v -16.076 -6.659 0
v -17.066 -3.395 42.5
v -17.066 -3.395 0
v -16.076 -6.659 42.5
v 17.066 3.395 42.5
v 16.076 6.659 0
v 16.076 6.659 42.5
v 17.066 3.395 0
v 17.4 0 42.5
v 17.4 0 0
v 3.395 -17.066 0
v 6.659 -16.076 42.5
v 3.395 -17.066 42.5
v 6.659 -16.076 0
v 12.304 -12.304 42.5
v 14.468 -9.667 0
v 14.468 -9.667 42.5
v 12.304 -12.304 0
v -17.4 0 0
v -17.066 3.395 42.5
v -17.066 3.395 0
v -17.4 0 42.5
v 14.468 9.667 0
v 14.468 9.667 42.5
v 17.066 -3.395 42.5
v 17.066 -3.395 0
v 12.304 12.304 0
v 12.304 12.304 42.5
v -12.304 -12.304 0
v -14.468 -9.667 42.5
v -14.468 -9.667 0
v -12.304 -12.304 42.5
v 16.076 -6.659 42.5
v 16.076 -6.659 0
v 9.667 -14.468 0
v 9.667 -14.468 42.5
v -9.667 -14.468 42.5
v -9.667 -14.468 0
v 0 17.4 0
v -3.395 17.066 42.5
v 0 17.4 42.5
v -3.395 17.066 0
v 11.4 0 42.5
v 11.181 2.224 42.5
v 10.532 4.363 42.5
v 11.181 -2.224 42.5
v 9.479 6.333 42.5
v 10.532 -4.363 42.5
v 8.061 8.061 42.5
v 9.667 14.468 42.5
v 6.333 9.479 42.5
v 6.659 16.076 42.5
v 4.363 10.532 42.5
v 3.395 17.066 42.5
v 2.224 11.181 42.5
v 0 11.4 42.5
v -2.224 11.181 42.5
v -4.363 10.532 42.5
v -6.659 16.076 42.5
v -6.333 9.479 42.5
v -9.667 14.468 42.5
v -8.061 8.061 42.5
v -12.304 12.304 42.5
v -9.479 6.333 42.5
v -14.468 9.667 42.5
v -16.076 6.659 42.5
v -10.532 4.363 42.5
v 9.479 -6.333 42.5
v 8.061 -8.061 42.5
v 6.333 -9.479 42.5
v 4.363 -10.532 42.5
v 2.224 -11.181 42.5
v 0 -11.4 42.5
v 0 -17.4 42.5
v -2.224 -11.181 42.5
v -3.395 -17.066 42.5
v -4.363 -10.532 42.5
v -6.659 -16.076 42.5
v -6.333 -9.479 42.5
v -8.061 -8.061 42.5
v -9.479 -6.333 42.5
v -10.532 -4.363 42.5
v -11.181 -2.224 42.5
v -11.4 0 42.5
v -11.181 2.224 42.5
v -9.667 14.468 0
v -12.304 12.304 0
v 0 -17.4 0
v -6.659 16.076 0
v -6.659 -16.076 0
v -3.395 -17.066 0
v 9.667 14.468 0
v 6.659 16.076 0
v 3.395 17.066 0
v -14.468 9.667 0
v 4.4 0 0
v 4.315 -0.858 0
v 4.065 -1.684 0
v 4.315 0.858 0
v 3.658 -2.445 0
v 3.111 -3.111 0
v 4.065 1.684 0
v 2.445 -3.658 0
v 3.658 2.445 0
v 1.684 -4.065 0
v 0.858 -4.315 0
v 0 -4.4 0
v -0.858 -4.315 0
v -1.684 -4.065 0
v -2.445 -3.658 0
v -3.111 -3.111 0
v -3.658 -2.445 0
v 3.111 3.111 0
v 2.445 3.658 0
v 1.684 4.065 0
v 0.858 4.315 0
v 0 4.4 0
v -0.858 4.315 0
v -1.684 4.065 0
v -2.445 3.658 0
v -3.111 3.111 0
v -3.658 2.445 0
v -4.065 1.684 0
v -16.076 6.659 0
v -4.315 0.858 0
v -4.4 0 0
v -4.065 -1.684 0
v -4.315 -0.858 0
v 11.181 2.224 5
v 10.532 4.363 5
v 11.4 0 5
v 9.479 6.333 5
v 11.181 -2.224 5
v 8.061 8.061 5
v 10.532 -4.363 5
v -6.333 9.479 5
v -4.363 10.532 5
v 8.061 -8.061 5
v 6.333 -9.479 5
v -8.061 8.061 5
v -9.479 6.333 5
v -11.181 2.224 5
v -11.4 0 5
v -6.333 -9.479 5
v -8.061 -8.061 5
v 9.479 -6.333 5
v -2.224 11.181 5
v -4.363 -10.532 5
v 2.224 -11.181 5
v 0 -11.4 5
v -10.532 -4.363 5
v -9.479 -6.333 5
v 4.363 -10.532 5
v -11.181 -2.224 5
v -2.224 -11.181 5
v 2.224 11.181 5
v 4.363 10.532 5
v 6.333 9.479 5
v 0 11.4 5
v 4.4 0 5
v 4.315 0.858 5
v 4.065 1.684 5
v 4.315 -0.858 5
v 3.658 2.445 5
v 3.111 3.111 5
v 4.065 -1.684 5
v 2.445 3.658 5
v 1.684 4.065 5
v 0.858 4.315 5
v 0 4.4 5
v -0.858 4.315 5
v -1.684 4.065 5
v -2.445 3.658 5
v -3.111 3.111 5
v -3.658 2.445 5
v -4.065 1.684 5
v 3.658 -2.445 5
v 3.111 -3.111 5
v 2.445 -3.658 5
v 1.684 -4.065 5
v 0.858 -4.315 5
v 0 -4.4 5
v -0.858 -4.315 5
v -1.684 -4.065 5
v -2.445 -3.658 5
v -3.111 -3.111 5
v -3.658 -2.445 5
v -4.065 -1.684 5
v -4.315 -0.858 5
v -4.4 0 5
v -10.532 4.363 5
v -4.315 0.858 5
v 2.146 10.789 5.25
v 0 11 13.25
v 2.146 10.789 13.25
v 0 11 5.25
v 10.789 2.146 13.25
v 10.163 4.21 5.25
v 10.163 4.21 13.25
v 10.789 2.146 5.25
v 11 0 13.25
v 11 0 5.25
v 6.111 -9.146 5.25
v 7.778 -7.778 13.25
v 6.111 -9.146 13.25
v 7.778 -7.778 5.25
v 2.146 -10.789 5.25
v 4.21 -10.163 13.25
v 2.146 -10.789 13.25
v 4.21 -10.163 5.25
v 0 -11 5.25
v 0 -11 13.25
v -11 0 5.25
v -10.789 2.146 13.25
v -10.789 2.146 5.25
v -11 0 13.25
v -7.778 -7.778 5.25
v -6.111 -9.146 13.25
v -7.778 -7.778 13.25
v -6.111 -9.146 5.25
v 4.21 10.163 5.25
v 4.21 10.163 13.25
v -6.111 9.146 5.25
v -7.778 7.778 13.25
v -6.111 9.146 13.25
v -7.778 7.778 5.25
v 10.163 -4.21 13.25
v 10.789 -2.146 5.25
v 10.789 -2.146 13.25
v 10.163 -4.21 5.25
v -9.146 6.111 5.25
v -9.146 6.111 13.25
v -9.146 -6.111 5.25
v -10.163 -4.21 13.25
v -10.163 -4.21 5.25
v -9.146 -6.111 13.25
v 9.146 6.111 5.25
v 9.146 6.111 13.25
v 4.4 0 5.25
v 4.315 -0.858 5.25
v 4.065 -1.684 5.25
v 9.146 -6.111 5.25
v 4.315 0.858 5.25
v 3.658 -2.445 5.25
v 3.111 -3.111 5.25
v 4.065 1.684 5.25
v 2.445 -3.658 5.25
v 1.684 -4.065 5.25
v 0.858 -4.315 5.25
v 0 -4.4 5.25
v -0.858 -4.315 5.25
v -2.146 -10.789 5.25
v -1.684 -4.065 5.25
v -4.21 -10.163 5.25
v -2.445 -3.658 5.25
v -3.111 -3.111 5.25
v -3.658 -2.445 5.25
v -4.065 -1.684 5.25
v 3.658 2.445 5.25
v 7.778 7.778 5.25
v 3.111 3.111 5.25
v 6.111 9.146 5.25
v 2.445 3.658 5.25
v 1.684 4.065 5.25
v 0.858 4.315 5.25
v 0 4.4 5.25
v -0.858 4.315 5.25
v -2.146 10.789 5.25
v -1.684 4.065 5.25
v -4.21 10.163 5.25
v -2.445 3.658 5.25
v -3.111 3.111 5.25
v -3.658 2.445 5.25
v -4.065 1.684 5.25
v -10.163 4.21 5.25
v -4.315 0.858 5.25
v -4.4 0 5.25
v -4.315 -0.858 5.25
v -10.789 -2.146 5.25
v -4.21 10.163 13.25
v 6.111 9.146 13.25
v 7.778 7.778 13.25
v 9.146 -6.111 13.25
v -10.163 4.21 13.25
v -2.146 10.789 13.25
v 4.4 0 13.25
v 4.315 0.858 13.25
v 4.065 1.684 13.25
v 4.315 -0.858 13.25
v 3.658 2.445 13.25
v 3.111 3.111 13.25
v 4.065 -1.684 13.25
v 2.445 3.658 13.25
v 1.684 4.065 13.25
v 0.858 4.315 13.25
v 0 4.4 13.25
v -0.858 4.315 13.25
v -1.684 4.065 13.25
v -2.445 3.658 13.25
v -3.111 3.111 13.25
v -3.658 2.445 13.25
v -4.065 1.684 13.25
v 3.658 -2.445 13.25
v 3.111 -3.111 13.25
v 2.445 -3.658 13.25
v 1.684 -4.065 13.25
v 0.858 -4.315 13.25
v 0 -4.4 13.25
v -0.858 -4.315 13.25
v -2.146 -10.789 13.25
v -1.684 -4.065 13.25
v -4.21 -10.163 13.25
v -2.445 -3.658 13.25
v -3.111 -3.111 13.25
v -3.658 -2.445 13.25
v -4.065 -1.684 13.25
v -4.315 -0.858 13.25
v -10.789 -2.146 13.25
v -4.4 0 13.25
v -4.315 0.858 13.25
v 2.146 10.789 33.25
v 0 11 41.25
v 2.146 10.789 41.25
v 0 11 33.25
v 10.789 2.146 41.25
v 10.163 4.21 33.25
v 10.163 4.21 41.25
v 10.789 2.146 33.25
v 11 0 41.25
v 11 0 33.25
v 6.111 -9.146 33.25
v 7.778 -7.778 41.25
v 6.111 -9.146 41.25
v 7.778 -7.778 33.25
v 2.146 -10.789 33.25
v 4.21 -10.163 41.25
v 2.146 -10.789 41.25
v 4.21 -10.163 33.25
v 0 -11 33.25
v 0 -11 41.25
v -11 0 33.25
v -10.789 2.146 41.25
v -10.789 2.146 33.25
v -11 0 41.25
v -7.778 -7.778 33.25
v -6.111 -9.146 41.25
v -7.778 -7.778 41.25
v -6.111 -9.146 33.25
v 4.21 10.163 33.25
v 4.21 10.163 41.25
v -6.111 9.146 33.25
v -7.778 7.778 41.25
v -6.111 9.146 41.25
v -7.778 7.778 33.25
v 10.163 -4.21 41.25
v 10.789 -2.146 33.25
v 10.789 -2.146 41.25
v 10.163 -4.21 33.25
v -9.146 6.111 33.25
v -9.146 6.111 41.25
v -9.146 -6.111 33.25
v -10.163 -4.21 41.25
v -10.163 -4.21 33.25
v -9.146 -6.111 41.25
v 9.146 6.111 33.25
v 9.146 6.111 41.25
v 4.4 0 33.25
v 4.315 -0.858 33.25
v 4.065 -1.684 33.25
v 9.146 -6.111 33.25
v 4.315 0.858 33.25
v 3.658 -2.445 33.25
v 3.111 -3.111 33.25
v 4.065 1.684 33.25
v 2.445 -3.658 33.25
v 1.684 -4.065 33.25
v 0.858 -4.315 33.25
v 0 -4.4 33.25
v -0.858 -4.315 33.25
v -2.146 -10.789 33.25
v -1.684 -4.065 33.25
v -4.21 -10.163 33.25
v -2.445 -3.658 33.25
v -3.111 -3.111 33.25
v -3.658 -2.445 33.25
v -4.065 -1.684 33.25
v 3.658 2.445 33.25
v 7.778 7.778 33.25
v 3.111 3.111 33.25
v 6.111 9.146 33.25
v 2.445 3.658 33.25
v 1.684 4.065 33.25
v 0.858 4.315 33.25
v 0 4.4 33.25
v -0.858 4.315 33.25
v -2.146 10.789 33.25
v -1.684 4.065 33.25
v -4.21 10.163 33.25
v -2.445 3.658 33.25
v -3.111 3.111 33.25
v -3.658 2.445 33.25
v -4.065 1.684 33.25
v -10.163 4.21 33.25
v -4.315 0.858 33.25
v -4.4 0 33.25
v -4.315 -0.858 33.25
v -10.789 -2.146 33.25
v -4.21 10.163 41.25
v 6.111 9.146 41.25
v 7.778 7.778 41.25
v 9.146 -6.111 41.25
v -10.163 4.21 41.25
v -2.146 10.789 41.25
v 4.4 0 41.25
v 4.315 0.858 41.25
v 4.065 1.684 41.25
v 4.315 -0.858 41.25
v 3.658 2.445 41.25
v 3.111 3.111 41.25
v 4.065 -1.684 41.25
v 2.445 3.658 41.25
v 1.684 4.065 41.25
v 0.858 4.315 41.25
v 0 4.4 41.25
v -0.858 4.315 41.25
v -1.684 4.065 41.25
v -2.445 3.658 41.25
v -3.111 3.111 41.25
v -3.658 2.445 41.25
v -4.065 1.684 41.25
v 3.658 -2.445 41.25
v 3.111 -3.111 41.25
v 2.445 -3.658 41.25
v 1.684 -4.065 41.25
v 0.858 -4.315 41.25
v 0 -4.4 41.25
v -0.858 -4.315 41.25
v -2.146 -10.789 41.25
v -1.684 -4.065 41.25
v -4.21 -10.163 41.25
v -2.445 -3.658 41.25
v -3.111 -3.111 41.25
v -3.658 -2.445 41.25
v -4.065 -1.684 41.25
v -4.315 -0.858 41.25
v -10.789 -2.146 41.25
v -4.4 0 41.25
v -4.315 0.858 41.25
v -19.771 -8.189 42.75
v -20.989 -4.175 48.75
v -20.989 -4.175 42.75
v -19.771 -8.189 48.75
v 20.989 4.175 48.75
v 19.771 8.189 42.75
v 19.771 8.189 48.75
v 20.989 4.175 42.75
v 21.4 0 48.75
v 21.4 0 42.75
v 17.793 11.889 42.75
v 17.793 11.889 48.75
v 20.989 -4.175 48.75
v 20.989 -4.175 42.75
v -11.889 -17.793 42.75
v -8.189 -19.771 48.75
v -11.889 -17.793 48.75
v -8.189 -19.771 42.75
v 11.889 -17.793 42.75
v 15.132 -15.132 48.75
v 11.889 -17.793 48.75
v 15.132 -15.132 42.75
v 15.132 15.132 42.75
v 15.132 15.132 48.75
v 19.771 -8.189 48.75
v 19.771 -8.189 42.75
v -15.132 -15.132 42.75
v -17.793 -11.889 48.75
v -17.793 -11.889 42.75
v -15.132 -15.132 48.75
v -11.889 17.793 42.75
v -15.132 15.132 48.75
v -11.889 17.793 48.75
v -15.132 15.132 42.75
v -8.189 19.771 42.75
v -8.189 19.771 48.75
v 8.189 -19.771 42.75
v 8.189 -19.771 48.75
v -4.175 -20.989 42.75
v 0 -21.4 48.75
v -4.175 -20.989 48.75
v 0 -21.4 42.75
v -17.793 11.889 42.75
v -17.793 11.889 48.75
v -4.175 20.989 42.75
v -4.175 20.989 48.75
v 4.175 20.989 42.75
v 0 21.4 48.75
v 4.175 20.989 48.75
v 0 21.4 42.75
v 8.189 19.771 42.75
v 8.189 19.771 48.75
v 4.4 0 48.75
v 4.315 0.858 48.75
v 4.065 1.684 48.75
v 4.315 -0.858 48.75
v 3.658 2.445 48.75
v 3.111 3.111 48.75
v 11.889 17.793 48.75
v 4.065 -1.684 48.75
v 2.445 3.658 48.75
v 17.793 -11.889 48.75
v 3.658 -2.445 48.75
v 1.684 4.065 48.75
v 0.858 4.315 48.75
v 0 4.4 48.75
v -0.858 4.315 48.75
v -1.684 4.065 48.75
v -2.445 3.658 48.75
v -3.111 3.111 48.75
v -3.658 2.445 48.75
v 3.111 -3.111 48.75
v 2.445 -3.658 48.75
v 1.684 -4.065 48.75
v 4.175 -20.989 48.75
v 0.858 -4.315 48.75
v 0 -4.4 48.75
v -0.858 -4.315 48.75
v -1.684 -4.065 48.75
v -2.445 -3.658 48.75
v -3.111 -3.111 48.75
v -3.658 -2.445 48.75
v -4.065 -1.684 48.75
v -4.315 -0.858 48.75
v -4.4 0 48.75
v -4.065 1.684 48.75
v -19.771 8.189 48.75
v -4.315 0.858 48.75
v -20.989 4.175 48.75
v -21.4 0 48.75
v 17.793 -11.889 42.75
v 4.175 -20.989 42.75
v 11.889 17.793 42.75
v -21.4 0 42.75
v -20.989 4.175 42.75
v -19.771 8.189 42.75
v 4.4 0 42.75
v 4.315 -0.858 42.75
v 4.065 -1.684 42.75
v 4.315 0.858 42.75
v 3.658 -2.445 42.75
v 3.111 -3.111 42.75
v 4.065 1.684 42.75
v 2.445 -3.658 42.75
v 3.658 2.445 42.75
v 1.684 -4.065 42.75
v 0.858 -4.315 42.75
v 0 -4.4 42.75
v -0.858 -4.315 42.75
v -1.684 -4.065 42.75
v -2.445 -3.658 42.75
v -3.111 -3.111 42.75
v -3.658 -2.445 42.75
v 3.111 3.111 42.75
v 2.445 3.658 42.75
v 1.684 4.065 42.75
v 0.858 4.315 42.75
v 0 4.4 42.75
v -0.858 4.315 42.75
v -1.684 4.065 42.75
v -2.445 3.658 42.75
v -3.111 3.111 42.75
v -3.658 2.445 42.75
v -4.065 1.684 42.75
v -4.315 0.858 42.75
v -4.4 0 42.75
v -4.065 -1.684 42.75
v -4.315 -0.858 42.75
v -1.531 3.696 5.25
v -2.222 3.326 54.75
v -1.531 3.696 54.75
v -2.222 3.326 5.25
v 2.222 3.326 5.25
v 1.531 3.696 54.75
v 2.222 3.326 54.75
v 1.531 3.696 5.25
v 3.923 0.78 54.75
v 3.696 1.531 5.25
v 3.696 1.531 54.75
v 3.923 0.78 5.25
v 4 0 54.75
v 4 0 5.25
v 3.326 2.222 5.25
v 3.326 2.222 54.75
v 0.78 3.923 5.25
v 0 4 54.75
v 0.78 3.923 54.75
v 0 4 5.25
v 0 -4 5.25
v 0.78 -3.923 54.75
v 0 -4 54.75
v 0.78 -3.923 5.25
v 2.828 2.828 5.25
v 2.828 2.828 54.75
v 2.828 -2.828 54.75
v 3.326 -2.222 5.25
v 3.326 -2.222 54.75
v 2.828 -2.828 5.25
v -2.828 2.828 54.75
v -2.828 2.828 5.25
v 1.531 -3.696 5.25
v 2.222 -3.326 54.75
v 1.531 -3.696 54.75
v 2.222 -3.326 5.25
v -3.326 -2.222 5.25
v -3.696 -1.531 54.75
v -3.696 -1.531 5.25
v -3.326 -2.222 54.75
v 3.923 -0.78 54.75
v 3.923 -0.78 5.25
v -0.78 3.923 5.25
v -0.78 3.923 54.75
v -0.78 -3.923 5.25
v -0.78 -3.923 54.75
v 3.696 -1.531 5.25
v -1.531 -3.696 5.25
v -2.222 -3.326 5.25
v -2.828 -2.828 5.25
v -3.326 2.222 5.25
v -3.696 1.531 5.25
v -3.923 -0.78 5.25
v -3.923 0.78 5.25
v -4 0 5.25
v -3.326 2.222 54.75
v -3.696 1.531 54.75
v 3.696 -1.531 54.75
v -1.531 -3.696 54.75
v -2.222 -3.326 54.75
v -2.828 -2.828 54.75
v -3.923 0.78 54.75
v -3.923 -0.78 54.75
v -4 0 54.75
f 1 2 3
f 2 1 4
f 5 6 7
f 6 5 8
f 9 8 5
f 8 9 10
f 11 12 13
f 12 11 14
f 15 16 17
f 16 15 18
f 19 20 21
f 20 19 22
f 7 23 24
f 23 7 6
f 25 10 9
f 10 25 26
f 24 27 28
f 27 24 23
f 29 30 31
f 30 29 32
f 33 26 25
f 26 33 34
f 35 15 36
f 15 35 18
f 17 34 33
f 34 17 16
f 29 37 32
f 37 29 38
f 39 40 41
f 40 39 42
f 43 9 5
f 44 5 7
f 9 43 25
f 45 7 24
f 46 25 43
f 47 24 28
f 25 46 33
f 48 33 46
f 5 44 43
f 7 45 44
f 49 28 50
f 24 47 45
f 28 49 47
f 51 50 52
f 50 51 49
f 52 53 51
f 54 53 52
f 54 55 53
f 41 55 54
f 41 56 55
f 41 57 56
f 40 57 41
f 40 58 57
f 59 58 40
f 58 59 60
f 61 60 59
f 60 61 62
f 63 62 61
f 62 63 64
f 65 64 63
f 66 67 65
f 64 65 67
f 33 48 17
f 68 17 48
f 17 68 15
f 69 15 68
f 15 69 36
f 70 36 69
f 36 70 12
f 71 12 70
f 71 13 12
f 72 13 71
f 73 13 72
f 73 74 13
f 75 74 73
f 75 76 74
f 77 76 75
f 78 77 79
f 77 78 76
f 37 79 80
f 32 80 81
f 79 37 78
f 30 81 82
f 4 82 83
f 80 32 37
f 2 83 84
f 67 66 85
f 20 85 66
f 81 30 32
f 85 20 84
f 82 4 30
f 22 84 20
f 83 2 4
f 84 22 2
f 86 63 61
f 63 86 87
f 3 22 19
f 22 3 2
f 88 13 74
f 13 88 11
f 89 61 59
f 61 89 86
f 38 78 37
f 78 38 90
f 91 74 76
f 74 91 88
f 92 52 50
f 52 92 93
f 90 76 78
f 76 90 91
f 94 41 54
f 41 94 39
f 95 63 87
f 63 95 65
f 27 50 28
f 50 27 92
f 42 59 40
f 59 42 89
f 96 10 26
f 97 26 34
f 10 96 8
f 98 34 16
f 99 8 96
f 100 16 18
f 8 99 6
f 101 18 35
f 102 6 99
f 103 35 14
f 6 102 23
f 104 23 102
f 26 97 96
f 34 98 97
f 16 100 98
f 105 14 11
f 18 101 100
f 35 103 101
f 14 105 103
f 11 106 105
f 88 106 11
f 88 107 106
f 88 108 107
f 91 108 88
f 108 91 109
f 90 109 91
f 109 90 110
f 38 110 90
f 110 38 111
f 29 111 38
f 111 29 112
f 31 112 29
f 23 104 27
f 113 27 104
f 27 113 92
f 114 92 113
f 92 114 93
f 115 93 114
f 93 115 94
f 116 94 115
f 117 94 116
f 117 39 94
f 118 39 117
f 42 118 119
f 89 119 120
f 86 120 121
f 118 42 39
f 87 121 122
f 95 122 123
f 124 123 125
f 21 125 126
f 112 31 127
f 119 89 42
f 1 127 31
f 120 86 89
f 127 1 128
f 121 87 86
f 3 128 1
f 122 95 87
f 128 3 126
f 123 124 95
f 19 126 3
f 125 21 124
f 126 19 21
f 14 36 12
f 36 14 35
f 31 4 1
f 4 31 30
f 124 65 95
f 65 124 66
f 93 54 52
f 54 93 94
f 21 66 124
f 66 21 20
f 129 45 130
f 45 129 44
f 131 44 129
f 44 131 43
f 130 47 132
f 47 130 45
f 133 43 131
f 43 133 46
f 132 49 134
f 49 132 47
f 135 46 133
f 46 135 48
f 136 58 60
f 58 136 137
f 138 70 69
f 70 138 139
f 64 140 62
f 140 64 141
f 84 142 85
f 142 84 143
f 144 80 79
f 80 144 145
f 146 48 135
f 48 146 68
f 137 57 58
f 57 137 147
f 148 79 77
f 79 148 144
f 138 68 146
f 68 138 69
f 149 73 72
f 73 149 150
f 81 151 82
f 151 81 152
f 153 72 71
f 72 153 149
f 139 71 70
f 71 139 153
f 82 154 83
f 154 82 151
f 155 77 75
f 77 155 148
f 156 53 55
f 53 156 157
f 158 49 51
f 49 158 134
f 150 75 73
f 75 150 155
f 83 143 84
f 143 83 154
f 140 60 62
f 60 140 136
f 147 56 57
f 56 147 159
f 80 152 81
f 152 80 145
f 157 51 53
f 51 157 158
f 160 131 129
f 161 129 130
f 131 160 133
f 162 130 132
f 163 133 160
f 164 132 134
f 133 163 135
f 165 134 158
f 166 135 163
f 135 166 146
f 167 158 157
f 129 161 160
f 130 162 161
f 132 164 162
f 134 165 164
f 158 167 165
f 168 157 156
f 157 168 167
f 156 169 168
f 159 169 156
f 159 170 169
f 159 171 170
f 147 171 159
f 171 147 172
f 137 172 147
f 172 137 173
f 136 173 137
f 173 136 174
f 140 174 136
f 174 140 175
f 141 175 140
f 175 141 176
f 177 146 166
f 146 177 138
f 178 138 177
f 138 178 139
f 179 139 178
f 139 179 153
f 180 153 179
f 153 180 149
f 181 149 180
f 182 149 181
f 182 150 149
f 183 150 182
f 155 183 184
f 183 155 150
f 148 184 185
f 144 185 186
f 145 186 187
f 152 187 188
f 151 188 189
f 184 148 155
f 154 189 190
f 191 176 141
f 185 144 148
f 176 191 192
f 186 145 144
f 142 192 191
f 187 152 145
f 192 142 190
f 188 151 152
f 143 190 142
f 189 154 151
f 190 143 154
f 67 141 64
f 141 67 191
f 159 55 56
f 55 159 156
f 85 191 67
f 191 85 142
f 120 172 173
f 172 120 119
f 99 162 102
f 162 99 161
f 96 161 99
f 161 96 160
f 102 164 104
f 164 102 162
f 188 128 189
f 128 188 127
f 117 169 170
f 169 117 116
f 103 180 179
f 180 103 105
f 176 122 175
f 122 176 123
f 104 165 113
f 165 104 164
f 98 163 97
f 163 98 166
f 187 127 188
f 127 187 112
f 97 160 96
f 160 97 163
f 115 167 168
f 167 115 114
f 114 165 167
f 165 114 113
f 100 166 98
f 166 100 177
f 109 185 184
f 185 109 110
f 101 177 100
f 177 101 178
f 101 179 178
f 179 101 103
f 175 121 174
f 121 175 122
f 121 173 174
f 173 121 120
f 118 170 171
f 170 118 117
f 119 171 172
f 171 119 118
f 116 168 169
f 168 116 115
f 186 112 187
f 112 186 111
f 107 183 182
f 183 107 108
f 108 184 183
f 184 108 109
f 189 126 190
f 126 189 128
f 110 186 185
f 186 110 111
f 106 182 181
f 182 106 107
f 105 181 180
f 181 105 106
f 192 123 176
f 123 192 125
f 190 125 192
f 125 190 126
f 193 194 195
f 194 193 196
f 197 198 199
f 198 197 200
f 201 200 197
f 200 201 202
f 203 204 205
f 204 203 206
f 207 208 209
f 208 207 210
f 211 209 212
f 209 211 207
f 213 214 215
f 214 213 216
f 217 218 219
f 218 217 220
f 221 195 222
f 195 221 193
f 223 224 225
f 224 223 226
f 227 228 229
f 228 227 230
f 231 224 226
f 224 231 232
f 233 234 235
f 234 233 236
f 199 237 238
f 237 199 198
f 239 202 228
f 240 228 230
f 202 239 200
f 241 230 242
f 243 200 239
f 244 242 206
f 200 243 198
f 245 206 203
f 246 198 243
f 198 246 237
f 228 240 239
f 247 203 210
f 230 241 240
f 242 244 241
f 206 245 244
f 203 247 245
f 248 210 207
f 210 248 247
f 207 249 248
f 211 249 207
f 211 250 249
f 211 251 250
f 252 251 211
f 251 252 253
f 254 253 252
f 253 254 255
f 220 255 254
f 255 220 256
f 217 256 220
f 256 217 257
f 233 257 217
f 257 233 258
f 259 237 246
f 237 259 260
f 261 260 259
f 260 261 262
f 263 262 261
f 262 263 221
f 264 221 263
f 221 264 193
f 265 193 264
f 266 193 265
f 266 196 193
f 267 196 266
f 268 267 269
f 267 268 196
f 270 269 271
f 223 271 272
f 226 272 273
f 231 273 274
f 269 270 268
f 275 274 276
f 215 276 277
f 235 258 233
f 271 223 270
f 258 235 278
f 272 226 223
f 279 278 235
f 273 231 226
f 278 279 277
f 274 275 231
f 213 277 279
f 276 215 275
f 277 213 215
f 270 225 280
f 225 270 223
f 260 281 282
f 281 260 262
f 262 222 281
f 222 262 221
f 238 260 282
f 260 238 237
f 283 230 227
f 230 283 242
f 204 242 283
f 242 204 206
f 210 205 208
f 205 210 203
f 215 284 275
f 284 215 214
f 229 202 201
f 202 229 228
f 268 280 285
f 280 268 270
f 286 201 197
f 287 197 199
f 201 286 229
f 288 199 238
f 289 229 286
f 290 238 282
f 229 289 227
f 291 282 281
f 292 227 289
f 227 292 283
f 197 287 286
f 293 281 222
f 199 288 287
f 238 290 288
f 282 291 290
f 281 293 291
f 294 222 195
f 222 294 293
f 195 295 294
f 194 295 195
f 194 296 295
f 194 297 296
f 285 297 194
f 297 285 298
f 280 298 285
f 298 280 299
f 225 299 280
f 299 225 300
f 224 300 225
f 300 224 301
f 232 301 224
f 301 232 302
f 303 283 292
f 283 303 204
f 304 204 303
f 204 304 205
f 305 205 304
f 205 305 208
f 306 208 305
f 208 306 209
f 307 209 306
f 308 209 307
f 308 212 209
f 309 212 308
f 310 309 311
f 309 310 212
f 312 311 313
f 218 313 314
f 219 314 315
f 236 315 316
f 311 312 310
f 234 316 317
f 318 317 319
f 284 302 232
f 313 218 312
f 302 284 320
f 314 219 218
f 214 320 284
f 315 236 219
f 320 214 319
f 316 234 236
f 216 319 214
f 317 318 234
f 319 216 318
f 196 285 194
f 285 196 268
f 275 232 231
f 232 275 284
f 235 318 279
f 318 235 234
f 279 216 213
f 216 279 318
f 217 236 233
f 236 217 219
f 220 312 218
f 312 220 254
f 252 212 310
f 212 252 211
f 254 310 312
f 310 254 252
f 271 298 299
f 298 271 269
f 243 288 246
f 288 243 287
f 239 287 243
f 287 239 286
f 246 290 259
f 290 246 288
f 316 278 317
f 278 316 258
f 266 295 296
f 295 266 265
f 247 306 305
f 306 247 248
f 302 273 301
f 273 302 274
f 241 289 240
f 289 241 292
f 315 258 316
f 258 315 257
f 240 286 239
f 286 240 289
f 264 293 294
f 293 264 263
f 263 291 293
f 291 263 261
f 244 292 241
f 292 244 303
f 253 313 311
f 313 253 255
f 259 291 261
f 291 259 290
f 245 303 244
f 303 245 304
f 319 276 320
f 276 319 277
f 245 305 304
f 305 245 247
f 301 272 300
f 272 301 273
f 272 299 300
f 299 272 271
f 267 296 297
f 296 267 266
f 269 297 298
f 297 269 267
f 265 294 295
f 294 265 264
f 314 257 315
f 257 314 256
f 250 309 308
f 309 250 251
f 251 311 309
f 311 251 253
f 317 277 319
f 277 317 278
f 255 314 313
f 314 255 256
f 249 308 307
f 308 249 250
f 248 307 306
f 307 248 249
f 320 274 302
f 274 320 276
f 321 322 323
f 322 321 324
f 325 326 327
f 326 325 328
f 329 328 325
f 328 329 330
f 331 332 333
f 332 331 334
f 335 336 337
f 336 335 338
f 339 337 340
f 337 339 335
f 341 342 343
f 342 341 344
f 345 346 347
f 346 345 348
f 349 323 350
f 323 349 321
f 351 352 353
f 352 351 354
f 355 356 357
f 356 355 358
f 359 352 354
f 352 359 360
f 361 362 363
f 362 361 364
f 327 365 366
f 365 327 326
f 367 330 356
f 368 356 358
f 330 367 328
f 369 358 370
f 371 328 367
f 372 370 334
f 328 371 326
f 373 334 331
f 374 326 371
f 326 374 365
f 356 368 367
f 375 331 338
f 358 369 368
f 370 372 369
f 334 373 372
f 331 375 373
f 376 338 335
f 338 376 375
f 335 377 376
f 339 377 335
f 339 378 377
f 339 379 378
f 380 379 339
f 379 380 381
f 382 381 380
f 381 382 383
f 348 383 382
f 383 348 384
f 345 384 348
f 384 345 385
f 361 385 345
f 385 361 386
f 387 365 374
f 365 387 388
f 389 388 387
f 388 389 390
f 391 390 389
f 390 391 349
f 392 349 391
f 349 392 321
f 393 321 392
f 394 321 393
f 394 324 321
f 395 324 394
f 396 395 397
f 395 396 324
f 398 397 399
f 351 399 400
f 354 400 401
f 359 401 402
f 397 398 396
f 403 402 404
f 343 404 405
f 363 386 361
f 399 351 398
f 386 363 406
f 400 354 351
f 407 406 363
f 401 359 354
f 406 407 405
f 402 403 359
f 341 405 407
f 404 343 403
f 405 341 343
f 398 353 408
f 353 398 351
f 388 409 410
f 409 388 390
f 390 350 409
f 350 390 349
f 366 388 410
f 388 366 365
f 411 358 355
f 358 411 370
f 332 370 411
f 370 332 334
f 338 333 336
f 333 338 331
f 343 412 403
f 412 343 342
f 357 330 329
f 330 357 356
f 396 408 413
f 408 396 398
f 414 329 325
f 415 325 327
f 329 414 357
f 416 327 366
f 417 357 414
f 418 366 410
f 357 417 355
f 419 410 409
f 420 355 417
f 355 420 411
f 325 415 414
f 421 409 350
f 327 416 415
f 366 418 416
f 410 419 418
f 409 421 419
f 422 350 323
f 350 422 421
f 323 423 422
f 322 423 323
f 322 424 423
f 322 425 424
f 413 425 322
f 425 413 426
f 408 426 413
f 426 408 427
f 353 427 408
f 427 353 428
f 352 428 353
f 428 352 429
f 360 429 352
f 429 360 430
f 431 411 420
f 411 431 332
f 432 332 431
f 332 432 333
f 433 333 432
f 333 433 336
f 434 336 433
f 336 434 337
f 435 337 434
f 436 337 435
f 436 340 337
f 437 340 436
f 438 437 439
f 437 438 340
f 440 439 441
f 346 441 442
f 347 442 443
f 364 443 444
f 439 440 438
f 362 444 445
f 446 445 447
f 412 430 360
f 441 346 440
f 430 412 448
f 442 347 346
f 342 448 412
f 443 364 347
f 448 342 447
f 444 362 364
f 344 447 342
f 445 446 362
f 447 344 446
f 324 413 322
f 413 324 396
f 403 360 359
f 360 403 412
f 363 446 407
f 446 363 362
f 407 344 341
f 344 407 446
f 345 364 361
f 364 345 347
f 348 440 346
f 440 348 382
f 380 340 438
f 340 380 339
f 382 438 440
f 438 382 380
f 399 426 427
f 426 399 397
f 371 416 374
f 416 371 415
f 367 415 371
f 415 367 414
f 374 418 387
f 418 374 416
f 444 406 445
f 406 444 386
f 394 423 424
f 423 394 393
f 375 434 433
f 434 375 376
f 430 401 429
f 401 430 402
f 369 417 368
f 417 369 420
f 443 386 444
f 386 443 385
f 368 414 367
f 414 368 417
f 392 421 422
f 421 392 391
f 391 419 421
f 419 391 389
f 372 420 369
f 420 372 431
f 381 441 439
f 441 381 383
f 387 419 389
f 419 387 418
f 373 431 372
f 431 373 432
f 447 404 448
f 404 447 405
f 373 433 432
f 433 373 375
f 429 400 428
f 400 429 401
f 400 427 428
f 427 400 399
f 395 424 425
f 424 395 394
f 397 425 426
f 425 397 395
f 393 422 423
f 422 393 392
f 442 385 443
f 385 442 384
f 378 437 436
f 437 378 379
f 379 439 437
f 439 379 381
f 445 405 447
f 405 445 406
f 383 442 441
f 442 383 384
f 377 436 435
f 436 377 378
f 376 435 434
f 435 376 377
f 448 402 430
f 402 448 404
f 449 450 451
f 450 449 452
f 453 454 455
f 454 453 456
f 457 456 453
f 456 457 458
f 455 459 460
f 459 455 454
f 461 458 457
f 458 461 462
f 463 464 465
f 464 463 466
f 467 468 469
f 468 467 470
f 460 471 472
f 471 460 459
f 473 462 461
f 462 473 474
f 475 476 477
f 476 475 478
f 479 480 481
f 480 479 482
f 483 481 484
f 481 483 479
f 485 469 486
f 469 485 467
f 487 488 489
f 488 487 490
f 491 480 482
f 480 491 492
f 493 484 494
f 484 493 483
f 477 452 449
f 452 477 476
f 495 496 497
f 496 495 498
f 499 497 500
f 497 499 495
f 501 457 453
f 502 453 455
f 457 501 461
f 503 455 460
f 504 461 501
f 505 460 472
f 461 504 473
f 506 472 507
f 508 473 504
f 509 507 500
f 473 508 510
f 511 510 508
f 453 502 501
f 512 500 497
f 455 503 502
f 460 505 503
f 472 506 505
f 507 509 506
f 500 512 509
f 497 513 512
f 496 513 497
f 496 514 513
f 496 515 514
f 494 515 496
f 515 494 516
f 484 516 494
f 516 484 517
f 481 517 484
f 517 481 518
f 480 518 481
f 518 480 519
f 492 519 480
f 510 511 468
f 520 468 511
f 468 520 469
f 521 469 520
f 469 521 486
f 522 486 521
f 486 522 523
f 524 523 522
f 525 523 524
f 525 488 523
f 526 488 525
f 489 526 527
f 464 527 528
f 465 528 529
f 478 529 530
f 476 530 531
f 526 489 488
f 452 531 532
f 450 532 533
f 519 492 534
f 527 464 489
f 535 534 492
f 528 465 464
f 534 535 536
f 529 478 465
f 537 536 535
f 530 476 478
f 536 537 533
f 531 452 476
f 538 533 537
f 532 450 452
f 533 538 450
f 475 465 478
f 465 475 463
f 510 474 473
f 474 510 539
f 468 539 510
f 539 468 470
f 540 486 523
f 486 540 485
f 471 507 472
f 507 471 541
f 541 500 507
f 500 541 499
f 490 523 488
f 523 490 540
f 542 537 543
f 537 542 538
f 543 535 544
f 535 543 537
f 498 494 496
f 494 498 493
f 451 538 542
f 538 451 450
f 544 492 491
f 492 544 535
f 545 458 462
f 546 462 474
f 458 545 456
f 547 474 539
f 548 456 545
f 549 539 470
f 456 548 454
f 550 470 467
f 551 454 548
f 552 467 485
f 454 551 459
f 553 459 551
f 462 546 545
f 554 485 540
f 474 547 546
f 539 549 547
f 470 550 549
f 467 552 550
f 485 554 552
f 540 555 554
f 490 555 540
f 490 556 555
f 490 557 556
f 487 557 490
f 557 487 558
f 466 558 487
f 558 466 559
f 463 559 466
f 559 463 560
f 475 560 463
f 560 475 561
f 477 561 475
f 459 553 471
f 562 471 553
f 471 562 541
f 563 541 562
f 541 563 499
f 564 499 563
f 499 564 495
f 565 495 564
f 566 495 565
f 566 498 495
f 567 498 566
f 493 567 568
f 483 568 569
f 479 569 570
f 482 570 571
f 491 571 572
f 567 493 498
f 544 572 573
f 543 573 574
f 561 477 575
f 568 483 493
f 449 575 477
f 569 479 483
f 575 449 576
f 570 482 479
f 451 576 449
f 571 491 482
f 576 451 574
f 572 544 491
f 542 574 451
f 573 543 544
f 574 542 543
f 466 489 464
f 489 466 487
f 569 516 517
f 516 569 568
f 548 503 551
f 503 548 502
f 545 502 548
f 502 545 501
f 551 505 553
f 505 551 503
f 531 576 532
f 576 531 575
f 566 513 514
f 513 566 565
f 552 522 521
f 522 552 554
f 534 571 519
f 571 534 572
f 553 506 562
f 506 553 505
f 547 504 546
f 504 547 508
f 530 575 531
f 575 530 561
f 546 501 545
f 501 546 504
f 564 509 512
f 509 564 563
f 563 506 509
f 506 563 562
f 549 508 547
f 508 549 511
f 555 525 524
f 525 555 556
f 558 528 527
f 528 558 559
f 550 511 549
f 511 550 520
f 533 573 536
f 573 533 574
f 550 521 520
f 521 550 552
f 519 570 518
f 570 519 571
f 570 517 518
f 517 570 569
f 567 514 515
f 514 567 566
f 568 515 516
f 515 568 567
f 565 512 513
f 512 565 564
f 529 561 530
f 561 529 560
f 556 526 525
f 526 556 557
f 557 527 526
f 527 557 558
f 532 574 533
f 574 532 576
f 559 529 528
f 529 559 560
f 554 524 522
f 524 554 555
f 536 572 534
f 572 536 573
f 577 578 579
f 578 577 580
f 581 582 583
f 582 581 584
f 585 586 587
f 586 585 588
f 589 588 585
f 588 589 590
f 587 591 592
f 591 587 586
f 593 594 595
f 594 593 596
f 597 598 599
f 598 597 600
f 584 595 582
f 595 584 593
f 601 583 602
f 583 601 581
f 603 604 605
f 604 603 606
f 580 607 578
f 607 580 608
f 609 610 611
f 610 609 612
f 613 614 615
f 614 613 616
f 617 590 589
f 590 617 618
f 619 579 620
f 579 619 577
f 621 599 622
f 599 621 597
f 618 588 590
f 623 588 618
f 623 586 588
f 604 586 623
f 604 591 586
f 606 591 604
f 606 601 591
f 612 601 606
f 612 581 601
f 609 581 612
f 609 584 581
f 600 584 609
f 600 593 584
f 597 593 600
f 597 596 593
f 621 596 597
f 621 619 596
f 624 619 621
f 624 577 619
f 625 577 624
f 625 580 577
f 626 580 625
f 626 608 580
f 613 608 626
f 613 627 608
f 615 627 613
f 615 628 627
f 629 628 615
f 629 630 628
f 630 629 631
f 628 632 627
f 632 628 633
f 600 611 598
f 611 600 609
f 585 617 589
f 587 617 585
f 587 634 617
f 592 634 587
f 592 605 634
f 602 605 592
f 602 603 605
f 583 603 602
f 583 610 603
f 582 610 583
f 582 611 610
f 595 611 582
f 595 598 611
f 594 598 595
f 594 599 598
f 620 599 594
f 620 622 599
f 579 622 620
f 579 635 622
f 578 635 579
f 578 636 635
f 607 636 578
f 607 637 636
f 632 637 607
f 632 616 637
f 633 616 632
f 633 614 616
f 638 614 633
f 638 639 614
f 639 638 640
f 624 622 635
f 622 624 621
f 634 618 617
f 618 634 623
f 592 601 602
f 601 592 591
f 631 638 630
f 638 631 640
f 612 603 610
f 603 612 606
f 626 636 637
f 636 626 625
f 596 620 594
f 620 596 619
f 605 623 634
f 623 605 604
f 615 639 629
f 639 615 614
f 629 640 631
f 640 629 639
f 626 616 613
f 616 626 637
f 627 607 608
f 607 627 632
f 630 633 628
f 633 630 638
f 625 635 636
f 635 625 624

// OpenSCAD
$fn = 32;

// ------------------------------------------------------------------------
// Shaft station: cup d34.8 x 42.5 mm, shaft d8
// Every part is its own module, assembly() places every instance.
// ------------------------------------------------------------------------

// --- part 1 ---
module housing_cup() {
  difference() {
    cylinder(h = 42.5, d = 34.8);
    translate([0, 0, 5]) cylinder(h = 38.5, d = 22.8);
    translate([0, 0, -1]) cylinder(h = 7, d = 8.8);
  }
}

// --- part 2 ---
module bearing_lower() {
  difference() {
      translate([0, 0, 0]) cylinder(h = 8, d = 22);
      translate([0, 0, -1]) cylinder(h = 10, d = 8.8);
    }
}

// --- part 3 ---
module bearing_upper() {
  difference() {
      translate([0, 0, 0]) cylinder(h = 8, d = 22);
      translate([0, 0, -1]) cylinder(h = 10, d = 8.8);
    }
}

// --- part 4 ---
module station_shaft() {
  translate([0, 0, -24.75]) cylinder(h = 49.5, d = 8);
}

// --- part 5 ---
module station_cover() {
  difference() {
    cylinder(h = 6, d = 42.8);
    translate([0, 0, -1]) cylinder(h = 8, d = 8.8);
  }
}

// --- assembly ---
module assembly() {
  color([0.80, 0.24, 0.20]) translate([0, 0, 0]) rotate([0, 0, 0]) housing_cup();
  color([0.20, 0.45, 0.75]) translate([0, 0, 5.25]) rotate([0, 0, 0]) bearing_lower();
  color([0.25, 0.62, 0.32]) translate([0, 0, 33.25]) rotate([0, 0, 0]) bearing_upper();
  color([0.92, 0.70, 0.18]) translate([0, 0, 30]) rotate([0, 0, 0]) station_shaft();
  color([0.58, 0.35, 0.70]) translate([0, 0, 42.75]) rotate([0, 0, 0]) station_cover();
}

assembly();
